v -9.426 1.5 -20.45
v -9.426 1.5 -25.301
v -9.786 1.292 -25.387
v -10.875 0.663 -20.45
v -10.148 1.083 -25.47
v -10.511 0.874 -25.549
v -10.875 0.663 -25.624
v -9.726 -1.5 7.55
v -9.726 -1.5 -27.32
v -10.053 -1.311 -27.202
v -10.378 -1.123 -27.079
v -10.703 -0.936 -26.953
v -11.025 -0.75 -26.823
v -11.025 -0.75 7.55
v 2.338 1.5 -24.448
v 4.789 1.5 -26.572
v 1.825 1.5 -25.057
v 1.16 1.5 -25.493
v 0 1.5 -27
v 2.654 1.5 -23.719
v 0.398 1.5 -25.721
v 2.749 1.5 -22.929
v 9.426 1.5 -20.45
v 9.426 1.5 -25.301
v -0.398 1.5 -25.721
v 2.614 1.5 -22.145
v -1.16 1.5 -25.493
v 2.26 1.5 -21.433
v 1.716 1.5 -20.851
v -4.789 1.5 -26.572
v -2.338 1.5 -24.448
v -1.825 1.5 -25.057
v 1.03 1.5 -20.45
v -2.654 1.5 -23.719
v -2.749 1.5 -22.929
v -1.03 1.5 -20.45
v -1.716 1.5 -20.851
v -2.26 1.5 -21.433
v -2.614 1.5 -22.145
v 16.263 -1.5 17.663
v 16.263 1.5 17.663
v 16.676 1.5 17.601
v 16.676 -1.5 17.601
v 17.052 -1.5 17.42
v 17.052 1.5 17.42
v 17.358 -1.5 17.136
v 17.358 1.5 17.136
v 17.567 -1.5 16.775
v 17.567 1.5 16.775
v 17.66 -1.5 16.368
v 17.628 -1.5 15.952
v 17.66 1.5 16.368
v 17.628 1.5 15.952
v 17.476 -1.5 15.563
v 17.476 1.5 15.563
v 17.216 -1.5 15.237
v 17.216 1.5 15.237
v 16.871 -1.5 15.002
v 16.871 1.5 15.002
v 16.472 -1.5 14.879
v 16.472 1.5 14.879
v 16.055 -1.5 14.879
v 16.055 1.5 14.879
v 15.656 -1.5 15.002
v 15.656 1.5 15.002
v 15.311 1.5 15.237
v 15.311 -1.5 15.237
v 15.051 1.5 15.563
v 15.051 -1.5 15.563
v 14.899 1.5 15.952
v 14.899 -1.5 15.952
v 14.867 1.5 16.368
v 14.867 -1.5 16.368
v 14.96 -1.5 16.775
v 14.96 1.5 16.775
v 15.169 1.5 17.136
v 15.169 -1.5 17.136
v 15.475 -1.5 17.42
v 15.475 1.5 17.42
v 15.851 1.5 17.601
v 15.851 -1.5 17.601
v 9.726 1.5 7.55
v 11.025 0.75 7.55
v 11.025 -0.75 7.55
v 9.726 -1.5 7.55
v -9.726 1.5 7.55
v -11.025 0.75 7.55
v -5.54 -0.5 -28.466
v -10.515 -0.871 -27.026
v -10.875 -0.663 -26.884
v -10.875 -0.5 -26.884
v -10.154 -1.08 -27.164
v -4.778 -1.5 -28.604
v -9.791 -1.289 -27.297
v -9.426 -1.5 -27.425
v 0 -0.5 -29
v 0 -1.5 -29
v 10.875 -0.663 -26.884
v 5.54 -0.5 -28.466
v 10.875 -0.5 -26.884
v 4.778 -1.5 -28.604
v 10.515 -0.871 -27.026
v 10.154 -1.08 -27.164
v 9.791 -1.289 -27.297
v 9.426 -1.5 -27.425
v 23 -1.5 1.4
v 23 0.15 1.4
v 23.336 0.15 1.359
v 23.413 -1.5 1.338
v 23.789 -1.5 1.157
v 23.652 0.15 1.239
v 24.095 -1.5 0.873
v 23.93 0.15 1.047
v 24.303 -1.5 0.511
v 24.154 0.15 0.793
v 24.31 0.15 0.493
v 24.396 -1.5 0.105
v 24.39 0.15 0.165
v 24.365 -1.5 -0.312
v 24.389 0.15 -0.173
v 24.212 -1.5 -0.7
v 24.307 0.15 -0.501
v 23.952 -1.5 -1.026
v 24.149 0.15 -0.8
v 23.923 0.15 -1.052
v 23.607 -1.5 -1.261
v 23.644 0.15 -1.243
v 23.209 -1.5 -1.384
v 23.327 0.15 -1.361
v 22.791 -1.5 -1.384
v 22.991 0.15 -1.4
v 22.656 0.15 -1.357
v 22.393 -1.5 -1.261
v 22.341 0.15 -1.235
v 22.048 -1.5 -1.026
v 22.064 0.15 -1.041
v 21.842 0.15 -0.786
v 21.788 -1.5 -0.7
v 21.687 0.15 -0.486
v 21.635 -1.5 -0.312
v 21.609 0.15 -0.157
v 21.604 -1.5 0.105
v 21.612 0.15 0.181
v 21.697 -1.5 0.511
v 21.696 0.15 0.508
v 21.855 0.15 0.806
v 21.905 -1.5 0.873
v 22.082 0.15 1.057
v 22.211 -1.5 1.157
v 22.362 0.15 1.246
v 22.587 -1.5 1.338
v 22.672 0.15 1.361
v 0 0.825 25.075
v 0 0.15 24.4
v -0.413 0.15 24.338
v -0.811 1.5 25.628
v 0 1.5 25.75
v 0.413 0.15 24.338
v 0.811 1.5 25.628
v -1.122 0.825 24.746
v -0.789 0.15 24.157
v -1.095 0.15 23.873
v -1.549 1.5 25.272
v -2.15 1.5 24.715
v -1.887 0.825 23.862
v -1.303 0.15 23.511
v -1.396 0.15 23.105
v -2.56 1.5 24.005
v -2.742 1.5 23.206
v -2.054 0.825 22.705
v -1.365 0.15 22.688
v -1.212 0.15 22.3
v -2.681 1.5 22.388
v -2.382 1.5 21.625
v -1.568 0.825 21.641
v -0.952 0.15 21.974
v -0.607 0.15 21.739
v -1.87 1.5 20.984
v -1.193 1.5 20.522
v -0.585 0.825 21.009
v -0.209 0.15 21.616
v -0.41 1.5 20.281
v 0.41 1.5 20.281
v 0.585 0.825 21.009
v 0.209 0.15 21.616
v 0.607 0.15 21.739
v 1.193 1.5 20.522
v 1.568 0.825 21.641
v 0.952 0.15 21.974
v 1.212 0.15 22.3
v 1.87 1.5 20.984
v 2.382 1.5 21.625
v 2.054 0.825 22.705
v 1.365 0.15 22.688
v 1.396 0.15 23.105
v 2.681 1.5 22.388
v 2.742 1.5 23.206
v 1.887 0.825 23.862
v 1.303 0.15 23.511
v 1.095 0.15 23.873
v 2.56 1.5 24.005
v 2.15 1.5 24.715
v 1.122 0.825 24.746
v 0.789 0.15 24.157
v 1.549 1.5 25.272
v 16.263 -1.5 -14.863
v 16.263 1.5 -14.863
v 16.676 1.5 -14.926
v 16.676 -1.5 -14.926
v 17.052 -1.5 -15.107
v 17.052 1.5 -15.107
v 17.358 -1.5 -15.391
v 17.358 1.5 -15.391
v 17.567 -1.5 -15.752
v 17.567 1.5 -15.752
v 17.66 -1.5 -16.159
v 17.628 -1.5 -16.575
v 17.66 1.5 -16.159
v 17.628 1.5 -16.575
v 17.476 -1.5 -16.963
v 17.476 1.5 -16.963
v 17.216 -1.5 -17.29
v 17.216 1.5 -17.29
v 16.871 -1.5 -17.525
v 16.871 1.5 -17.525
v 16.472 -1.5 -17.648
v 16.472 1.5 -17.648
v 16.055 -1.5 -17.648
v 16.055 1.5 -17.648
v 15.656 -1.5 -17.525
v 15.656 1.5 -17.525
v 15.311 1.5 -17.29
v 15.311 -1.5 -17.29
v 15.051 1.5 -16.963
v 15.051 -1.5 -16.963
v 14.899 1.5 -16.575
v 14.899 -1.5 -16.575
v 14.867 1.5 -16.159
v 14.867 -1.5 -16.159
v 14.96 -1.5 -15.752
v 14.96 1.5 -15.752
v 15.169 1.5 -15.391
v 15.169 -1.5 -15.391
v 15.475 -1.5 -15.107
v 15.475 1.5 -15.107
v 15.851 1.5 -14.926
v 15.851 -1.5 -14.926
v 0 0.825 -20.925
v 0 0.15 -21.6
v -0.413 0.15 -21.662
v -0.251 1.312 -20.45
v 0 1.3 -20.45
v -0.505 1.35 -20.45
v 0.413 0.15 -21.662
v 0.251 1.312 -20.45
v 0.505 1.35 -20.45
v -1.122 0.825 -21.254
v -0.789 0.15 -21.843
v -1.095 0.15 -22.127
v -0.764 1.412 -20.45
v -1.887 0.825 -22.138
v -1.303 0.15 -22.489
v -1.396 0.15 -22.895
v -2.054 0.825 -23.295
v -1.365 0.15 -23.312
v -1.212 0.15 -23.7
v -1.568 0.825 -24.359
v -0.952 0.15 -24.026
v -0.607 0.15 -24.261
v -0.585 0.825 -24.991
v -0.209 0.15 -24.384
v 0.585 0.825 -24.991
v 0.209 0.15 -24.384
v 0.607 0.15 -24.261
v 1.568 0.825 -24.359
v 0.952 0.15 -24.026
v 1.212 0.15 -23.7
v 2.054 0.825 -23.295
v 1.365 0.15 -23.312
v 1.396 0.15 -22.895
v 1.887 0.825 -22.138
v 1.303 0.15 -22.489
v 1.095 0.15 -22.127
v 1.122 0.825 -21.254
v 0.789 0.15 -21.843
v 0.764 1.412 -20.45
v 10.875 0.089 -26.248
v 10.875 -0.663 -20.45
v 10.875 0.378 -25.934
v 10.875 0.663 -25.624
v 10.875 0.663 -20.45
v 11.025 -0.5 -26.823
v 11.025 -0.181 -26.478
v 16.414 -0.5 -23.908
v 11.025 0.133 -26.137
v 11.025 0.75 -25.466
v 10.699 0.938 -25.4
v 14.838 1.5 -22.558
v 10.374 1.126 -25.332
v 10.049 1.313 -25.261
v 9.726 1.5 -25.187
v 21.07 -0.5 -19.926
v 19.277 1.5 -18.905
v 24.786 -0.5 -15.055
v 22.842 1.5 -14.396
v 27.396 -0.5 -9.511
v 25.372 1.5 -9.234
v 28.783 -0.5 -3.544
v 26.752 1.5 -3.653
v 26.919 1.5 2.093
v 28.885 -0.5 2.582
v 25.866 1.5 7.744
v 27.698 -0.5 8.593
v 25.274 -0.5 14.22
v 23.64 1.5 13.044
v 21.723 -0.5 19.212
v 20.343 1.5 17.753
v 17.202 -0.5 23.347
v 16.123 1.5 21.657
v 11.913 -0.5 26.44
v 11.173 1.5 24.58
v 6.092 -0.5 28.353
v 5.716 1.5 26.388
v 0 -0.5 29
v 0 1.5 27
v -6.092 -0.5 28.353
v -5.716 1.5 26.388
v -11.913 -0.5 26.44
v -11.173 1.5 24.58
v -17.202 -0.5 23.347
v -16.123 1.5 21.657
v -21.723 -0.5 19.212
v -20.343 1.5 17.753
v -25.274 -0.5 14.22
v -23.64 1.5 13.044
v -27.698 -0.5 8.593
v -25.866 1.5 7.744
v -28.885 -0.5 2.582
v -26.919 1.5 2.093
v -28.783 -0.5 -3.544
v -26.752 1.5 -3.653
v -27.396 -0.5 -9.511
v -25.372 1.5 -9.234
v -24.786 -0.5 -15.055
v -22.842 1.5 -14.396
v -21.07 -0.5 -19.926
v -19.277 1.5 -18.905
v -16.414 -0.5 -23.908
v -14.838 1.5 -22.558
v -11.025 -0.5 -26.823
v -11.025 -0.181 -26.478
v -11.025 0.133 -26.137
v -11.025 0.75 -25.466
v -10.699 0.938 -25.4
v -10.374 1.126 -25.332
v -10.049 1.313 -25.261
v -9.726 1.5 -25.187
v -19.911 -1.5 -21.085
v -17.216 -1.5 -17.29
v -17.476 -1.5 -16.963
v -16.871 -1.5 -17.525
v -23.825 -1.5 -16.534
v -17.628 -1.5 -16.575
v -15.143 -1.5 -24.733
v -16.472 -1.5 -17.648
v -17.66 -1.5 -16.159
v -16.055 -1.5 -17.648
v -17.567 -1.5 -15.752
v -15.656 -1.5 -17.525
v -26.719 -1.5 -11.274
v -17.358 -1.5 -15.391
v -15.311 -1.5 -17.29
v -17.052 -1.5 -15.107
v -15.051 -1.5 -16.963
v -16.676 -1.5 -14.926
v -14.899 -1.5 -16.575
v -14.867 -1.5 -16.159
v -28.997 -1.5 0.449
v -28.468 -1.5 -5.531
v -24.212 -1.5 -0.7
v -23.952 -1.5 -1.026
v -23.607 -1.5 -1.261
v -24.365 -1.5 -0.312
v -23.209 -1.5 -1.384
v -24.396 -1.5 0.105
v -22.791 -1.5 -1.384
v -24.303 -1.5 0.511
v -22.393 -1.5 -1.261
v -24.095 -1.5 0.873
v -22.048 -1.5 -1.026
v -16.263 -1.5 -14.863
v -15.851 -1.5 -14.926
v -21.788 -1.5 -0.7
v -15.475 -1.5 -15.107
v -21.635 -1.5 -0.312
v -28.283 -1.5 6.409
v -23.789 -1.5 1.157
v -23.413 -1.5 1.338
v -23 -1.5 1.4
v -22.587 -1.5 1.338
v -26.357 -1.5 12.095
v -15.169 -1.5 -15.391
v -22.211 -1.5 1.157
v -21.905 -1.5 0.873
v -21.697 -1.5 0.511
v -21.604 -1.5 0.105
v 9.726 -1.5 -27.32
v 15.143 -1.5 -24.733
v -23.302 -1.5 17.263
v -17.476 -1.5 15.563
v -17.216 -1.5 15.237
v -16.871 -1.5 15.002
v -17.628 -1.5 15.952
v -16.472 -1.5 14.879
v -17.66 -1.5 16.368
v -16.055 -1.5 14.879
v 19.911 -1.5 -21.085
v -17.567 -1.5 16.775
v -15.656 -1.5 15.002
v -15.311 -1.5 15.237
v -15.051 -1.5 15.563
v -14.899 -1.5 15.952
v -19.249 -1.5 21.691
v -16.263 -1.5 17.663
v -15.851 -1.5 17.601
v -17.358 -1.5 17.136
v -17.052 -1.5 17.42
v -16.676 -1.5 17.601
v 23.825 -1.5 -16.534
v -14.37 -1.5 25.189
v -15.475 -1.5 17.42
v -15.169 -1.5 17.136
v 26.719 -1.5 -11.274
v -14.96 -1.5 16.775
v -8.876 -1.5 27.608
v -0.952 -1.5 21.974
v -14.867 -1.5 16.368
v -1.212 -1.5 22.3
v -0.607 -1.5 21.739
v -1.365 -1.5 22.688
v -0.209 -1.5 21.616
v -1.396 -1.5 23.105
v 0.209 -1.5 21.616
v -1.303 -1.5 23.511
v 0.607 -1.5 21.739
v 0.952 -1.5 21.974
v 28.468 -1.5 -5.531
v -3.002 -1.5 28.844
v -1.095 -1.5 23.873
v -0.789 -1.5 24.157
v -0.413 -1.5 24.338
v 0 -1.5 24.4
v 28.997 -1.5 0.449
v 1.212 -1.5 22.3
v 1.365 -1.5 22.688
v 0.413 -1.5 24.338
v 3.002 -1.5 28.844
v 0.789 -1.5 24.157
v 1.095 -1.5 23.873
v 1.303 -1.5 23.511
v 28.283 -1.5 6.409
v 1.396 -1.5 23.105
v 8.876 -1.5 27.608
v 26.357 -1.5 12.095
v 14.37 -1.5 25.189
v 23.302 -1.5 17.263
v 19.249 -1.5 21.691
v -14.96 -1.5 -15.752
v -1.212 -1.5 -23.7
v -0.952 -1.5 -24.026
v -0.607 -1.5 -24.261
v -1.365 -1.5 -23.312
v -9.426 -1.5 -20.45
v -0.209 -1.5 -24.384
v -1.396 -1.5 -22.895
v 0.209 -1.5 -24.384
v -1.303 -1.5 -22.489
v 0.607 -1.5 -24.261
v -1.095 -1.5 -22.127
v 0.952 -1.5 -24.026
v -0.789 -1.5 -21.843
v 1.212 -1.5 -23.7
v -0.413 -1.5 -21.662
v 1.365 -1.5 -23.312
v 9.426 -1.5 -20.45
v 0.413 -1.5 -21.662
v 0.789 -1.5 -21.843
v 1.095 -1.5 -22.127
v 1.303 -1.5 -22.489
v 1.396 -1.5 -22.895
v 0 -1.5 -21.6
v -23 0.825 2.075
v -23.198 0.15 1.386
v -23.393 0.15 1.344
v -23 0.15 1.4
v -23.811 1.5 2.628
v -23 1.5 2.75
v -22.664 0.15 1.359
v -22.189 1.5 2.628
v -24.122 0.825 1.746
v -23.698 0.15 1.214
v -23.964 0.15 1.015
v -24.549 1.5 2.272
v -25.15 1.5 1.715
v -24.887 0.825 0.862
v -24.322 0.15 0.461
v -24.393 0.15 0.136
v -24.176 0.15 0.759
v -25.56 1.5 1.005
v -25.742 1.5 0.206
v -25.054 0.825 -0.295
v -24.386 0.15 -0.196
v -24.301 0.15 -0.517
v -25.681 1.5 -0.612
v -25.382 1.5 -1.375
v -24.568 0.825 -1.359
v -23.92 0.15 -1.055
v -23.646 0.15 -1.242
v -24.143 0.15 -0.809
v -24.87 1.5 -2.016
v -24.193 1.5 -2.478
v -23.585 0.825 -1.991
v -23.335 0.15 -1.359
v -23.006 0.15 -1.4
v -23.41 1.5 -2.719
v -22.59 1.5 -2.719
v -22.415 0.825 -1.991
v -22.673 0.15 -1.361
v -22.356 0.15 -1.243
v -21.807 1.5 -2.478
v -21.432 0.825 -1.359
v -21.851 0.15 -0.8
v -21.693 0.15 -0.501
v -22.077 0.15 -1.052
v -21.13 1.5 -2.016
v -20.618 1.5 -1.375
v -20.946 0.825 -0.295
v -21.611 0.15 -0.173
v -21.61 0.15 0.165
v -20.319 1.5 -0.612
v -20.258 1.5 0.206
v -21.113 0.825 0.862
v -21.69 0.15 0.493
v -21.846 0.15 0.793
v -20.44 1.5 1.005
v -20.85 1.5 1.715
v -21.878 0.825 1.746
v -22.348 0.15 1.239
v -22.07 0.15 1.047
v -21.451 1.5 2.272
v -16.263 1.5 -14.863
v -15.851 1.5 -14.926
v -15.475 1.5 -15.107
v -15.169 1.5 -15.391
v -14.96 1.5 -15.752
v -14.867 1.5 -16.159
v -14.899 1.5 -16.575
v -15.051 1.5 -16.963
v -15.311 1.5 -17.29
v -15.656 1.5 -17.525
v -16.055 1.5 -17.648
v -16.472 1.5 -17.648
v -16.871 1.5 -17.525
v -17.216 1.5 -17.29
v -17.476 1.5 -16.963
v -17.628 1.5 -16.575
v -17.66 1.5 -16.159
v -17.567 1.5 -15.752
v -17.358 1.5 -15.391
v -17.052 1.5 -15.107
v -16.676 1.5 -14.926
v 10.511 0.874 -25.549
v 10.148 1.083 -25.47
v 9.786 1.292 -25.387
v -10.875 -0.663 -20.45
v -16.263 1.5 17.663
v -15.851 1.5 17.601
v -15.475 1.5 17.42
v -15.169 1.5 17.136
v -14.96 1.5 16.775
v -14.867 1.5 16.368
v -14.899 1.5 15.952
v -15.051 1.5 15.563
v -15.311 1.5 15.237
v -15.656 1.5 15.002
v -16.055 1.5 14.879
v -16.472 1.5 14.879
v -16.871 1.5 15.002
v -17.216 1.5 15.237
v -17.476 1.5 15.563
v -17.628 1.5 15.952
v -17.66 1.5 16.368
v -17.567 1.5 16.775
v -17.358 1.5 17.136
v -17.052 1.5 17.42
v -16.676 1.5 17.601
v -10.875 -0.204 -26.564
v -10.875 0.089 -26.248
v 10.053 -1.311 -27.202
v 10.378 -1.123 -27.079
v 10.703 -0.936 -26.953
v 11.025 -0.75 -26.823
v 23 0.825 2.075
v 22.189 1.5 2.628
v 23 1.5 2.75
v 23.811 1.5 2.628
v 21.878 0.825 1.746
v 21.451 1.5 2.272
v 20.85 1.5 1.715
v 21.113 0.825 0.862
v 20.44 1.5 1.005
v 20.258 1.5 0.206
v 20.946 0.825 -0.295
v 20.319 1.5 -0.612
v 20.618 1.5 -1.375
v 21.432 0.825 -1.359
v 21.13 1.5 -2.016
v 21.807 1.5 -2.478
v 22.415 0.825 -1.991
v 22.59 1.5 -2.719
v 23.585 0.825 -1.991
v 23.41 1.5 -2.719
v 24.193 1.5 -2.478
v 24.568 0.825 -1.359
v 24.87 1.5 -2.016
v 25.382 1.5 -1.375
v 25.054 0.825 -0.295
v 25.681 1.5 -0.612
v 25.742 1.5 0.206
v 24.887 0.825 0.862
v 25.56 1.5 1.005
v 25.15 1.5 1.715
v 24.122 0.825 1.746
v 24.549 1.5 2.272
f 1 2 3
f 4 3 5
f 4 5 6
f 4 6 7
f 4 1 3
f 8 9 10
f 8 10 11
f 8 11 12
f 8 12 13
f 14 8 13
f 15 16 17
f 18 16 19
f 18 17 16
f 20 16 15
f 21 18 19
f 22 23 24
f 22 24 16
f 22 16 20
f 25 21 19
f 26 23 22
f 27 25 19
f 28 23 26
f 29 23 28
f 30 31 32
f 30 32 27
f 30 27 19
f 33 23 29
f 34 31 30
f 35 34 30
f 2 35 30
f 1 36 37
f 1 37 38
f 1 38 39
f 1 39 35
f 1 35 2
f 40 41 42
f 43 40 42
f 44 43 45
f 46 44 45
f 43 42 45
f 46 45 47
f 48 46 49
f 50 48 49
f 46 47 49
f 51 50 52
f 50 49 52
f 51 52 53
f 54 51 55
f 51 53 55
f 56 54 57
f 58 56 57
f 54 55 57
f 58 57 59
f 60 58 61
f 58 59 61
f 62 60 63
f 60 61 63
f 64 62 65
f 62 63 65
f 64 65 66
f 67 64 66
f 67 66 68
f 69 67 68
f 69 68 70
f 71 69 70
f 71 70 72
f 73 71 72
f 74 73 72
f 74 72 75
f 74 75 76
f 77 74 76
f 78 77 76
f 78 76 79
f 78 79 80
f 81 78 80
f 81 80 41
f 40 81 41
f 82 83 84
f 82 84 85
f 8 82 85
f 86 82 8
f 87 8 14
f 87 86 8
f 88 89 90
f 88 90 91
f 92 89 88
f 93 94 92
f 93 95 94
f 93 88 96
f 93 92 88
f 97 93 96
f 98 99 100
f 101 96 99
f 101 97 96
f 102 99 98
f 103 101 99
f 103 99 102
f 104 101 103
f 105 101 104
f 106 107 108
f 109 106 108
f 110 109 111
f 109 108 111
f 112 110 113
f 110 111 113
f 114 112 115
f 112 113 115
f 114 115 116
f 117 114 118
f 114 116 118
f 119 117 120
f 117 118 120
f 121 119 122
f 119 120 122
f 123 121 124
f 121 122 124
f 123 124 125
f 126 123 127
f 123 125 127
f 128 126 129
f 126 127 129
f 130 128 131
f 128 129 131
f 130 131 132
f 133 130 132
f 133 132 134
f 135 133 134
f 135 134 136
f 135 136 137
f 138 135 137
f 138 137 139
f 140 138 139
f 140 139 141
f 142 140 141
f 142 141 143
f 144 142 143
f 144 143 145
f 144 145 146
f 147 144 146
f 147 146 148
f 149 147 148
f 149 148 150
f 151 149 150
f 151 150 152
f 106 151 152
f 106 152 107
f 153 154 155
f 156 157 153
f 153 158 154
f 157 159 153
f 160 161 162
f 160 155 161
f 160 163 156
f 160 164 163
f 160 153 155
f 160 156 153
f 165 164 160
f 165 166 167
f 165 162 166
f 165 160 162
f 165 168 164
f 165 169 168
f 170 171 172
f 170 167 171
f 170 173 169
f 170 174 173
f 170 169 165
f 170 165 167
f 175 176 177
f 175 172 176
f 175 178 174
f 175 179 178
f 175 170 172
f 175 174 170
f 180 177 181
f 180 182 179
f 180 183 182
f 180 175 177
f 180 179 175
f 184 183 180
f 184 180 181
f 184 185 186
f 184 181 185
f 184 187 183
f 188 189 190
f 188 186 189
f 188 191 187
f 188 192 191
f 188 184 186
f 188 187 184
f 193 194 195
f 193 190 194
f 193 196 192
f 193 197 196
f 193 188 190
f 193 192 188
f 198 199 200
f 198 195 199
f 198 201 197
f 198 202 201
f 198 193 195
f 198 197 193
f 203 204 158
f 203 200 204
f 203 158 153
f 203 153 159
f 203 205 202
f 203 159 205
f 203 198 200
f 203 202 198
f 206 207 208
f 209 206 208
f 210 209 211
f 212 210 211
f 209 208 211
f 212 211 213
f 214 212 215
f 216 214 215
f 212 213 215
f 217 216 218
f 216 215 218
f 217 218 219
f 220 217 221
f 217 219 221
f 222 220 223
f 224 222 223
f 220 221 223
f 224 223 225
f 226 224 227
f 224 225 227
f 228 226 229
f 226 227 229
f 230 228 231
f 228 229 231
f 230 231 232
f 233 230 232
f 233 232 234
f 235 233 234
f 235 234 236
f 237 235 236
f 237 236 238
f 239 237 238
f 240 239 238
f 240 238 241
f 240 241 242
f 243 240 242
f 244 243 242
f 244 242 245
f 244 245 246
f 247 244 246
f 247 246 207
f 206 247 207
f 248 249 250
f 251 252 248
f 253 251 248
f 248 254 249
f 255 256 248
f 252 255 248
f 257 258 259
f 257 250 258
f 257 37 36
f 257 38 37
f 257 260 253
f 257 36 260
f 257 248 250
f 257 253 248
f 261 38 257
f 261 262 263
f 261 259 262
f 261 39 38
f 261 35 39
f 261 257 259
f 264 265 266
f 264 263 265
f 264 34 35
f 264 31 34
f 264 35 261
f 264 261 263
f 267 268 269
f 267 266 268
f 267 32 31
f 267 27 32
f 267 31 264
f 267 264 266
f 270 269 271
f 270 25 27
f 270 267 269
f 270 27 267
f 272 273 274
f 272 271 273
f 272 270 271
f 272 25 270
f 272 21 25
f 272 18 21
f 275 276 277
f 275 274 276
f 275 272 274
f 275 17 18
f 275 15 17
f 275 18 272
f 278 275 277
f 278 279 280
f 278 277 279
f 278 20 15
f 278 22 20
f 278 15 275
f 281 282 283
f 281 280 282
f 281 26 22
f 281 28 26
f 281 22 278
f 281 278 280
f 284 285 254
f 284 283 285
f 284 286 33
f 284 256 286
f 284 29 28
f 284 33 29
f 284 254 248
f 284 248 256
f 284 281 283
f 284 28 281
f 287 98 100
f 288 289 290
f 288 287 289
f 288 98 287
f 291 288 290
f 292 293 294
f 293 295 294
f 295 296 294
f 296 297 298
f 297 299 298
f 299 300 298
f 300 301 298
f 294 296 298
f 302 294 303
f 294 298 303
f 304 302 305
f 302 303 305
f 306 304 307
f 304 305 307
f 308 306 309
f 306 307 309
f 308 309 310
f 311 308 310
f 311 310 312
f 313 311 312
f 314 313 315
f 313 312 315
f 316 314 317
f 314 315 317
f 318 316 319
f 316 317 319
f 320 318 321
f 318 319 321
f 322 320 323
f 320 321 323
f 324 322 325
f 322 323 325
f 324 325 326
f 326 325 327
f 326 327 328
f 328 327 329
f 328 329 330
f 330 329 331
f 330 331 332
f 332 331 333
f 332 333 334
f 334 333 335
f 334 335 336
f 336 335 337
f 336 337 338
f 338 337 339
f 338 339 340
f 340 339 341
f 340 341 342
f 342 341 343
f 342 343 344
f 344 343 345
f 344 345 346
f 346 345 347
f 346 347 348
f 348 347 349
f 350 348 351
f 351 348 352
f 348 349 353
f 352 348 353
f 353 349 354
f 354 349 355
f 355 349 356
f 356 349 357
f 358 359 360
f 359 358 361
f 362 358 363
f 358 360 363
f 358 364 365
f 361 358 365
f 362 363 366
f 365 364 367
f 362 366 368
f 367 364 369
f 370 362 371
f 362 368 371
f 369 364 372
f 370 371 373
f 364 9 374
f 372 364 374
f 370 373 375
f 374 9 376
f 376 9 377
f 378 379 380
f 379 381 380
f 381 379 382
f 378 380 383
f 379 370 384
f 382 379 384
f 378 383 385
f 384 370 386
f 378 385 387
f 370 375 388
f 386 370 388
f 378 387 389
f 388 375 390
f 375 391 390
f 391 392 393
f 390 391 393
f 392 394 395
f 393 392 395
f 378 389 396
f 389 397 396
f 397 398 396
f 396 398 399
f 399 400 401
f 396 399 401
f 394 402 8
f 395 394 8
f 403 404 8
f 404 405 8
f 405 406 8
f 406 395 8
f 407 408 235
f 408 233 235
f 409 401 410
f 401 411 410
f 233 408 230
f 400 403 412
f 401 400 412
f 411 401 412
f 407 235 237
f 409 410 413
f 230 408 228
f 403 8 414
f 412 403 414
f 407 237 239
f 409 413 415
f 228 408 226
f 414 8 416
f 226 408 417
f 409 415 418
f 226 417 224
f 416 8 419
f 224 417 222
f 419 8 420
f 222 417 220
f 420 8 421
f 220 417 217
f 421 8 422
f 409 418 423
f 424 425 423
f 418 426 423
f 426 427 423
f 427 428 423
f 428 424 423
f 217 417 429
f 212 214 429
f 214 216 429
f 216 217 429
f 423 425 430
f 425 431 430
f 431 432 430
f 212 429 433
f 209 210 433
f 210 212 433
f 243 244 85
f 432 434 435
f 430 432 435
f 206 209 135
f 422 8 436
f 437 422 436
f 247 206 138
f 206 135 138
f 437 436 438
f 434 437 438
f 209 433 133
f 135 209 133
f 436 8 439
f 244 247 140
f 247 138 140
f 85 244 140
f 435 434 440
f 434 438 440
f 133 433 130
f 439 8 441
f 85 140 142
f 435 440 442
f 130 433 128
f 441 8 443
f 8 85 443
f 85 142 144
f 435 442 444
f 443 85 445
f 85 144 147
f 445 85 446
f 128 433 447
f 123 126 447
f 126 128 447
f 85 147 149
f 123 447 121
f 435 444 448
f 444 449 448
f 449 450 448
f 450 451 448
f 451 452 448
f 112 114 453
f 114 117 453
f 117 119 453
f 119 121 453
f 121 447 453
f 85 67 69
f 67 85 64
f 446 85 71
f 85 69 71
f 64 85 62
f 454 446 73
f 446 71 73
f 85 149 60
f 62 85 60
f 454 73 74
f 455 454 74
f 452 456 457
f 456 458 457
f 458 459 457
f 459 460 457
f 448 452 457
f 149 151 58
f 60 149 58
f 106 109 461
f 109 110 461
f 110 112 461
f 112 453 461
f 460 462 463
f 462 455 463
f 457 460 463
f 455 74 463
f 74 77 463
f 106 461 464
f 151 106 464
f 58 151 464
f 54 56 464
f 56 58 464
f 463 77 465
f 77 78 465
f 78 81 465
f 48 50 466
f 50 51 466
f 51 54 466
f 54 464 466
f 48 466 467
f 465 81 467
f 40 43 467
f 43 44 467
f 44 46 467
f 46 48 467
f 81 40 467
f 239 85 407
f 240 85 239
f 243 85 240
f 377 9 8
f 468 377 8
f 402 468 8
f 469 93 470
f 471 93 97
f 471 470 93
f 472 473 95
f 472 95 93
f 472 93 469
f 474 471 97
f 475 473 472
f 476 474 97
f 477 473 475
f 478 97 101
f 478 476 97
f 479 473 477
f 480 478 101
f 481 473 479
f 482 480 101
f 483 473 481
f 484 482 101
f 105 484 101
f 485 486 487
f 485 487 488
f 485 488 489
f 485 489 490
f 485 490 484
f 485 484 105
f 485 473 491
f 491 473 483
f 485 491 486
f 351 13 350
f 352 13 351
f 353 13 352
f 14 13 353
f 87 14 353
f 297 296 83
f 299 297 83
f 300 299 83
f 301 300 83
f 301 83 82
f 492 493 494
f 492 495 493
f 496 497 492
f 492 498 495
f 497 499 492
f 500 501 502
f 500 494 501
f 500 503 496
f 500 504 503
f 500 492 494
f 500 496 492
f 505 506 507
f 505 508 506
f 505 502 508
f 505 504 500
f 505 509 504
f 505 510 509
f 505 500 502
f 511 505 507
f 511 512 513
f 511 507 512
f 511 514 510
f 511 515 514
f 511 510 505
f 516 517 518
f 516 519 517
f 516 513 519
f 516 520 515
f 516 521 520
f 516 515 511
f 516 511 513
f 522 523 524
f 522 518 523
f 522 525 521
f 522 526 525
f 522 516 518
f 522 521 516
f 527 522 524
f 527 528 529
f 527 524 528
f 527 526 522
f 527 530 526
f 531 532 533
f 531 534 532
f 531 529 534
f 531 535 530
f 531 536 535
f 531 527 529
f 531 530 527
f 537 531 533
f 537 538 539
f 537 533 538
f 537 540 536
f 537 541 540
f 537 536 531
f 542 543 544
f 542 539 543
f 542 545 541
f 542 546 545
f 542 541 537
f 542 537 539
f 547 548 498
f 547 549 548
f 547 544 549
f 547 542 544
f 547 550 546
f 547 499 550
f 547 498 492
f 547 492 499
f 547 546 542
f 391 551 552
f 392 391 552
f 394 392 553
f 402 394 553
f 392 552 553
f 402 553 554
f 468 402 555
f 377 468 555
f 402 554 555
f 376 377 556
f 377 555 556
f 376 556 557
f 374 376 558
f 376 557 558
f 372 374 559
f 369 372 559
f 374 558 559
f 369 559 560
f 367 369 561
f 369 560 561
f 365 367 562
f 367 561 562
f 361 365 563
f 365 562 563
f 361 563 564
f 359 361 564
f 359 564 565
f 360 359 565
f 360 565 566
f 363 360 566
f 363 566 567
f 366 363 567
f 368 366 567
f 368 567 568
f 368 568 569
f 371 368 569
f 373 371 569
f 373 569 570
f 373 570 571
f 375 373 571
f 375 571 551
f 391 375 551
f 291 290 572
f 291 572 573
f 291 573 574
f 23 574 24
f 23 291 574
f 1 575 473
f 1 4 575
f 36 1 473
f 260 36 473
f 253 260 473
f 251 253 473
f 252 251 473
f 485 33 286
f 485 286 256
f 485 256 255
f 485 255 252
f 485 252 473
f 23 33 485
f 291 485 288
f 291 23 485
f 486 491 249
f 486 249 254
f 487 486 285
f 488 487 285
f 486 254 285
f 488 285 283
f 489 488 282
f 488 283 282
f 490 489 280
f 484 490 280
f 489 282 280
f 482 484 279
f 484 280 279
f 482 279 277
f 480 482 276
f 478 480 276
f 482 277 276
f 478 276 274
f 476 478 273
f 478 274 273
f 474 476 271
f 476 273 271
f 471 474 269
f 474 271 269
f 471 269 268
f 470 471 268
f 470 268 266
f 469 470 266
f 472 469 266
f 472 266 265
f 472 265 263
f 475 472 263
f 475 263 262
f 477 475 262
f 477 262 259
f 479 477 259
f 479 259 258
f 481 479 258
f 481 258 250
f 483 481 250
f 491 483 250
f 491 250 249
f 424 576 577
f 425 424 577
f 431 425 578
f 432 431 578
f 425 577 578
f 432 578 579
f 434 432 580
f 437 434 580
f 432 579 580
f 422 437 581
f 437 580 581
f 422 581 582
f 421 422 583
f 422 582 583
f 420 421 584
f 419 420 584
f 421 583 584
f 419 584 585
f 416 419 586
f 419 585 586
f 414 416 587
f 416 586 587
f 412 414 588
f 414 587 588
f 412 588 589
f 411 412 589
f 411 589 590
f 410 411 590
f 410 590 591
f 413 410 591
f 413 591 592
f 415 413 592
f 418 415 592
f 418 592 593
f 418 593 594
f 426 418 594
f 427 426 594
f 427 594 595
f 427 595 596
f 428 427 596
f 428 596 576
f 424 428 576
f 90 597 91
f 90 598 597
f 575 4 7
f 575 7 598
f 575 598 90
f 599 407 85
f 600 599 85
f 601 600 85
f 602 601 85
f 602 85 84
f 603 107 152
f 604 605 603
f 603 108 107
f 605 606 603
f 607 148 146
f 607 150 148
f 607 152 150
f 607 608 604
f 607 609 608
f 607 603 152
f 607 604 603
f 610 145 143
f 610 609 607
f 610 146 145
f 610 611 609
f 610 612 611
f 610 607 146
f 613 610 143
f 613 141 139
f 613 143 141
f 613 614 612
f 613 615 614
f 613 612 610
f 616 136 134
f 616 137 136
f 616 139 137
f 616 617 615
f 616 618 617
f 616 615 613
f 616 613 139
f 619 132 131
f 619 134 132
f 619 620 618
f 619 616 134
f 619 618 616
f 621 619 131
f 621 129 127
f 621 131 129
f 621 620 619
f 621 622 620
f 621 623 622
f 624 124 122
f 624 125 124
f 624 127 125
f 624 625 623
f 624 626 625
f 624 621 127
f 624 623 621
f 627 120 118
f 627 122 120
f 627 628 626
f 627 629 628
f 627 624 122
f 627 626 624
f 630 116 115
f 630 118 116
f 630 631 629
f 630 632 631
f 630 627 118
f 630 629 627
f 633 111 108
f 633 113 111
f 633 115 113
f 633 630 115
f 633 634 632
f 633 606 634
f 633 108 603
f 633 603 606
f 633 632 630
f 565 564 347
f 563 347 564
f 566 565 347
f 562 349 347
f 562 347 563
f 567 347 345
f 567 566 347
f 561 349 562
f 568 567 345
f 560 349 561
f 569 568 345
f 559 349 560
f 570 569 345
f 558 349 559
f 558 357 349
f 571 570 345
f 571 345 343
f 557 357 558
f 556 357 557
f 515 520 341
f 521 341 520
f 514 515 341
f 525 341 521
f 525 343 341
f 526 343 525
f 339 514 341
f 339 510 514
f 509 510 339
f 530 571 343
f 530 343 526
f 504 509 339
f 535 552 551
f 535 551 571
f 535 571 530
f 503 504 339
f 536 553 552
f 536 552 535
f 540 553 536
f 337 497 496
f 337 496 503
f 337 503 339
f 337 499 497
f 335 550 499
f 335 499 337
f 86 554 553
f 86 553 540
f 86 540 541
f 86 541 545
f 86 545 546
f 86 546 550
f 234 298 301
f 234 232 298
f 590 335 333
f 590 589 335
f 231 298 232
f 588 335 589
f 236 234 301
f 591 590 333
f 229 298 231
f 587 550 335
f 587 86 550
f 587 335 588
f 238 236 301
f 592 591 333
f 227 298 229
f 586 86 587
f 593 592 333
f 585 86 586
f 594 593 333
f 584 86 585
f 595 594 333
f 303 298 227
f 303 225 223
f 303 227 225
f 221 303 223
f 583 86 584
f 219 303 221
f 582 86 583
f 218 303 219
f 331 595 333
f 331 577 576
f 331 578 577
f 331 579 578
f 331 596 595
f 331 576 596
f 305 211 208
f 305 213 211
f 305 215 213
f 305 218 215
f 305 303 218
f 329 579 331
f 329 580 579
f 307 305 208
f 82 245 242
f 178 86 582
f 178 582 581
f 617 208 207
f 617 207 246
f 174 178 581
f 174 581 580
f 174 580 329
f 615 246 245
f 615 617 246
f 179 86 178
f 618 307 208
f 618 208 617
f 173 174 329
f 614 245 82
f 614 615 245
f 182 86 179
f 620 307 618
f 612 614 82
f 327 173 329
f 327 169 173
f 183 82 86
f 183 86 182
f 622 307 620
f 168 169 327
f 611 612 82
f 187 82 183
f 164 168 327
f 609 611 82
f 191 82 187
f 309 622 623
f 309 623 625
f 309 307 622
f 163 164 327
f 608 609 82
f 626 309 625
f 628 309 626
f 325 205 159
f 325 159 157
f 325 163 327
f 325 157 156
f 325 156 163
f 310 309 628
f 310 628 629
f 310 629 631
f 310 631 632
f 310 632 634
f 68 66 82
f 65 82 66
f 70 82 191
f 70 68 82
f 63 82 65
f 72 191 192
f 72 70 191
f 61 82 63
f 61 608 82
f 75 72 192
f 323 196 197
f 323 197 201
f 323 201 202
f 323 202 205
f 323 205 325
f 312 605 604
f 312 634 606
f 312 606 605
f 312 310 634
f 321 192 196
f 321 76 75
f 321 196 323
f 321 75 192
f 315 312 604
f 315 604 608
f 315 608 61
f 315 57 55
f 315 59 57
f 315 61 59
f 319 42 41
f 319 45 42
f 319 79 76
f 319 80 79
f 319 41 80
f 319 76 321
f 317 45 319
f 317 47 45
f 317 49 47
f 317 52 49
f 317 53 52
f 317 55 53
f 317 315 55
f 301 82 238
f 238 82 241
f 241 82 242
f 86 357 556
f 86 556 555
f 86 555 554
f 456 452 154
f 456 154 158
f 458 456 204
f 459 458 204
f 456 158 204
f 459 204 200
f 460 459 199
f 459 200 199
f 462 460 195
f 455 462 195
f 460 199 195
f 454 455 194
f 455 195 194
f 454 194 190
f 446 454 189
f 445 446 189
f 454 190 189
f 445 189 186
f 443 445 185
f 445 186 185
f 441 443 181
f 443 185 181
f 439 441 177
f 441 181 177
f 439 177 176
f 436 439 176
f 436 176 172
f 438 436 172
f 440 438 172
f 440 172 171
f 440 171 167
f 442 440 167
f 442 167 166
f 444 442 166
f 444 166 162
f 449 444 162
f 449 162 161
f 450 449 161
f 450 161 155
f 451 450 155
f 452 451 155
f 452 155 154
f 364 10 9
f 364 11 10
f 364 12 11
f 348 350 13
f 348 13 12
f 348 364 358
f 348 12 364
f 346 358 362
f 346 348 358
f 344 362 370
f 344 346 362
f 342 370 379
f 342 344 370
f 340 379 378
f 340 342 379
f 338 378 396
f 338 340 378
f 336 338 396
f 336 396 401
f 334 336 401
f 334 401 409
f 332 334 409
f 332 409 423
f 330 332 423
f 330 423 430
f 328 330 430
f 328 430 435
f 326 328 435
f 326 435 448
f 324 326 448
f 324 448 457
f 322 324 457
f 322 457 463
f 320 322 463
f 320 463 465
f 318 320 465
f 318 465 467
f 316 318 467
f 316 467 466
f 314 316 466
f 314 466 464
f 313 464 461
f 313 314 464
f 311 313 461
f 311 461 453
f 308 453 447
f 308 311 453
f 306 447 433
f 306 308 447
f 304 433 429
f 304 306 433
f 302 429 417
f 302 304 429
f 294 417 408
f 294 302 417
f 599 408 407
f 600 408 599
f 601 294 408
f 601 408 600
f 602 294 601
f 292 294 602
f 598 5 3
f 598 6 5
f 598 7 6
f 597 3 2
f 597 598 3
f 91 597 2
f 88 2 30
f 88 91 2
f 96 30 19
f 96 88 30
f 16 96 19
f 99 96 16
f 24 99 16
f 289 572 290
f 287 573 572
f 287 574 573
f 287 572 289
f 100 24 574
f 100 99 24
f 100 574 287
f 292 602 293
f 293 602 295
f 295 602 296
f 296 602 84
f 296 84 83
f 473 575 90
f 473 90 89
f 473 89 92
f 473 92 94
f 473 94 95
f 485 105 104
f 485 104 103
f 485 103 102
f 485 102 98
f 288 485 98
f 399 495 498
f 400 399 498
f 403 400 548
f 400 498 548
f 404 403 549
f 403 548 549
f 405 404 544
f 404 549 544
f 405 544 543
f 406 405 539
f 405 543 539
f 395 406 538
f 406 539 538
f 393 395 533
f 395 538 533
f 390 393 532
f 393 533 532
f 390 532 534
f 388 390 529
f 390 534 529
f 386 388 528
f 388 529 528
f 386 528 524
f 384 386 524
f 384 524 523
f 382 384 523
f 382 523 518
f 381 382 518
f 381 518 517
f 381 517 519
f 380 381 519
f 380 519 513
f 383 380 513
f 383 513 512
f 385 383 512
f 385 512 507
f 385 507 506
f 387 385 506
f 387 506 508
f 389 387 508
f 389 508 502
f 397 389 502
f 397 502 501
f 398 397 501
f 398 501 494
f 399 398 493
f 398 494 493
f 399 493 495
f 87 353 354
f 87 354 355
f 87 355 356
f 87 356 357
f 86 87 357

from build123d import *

# Parameters (mm, degrees)
SKETCH1_R                                      = 29
BOSS_EXTRUDE1_DEPTH                            = 1.5
CUT_EXTRUDE1_DEPTH                             = 42.12177039
BOSS_EXTRUDE2_REACH                            = 46.997
BOSS_EXTRUDE2_END_RADIUS                       = 29
BOSS_EXTRUDE3_REACH                            = 59.346
BOSS_EXTRUDE3_END_RADIUS                       = 29
CHAMFER1_SIZE                                  = 2
CHAMFER2_SIZE                                  = 2
SKETCH5_R                                      = 1.4
CUT_EXTRUDE2_DEPTH                             = 42.12177039
CSK_FOR_M2_5_FLAT_HEAD_MACHINE_SCREW1_AT_COUNT = 2
CSK_FOR_M2_5_FLAT_HEAD_MACHINE_SCREW1_AT_PITCH = 32.526911935
CSK_FOR_M2_5_FLAT_HEAD_MACHINE_SCREW_2_COUNT   = 2
CSK_FOR_M2_5_FLAT_HEAD_MACHINE_SCREW_2_PITCH   = 46
CSK_FOR_M2_5_FLAT_HEAD_MACHINE_SCREW_3_COUNT   = 2
CSK_FOR_M2_5_FLAT_HEAD_MACHINE_SCREW_3_PITCH   = 32.526911935


with BuildPart() as part:
    # Sketch1 → Boss-Extrude1 (new, symmetric)
    with BuildSketch(Plane(origin=(0, 0, 0), x_dir=(1, 0, 0), z_dir=(0, 1, 0))):
        with Locations(Location((0, 0, 0), (0, 0, 270))):
            Circle(SKETCH1_R)
    extrude(amount=BOSS_EXTRUDE1_DEPTH, both=True)

    # Sketch2 → Cut-Extrude1 (cut, through all)
    with BuildSketch(Plane(origin=(0, 1.5, 0), x_dir=(1, 0, 0), z_dir=(0, 1, 0))):
        Polygon((-11.025, 7.55), (-11.025, 29), (11.025, 29), (11.025, 7.55), (11.025, -7.55), (-11.025, -7.55), align=None)
    extrude(amount=-CUT_EXTRUDE1_DEPTH, mode=Mode.SUBTRACT)

    # Boss-Extrude2: up to this cylinder (the profile starts inside it)
    boss_extrude2_end = Plane(origin=(0, -0.7325095, 0), z_dir=(0, -1, 0)) * Cylinder(BOSS_EXTRUDE2_END_RADIUS, 154.459019, mode=Mode.PRIVATE)
    # Sketch3 → Boss-Extrude2 (add, up to the surface)
    with BuildSketch(Plane(origin=(0, 0, 7.55), x_dir=(-1, 0, 0), z_dir=(0, 0, -1)), mode=Mode.PRIVATE) as boss_extrude2_sk1:
        Polygon((-11.525, -1.5), (-9.725961894, -1.5), (-11.025, -0.75), (-11.025, 0.75), (-9.725961894, 1.5), (-11.525, 1.5), align=None)
    boss_extrude2_tool1 = extrude(boss_extrude2_sk1.sketch, amount=BOSS_EXTRUDE2_REACH, mode=Mode.PRIVATE) & boss_extrude2_end
    add(boss_extrude2_tool1.solids().sort_by_distance((10.625481, -1.465019, 7.55))[0])
    # Sketch3 → Boss-Extrude2 (add, up to the surface)
    with BuildSketch(Plane(origin=(0, 0, 7.55), x_dir=(-1, 0, 0), z_dir=(0, 0, -1)), mode=Mode.PRIVATE) as boss_extrude2_sk2:
        Polygon((11.525, 1.5), (11.525, -1.5), (9.725961894, -1.5), (11.025, -0.75), (11.025, 0.75), (9.725961894, 1.5), align=None)
    boss_extrude2_tool2 = extrude(boss_extrude2_sk2.sketch, amount=BOSS_EXTRUDE2_REACH, mode=Mode.PRIVATE) & boss_extrude2_end
    add(boss_extrude2_tool2.solids().sort_by_distance((-11.490019, 0, 7.55))[0])

    # Chamfer1
    chamfer1_edges = [part.edges().sort_by_distance(p)[0] for p in [
        (0, 1.5, 29),
    ]]
    chamfer(chamfer1_edges, length=CHAMFER1_SIZE)


with BuildPart() as body_2:
    # Boss-Extrude3: up to this cylinder (the profile starts inside it)
    boss_extrude3_end = Plane(origin=(0, 0, 0), z_dir=(0, -1, 0)) * Cylinder(BOSS_EXTRUDE3_END_RADIUS, 177.692, mode=Mode.PRIVATE)
    # Sketch6 → Boss-Extrude3 (new, up to the surface)
    with BuildSketch(Plane(origin=(0, 0, -20.45), x_dir=(-1, 0, 0), z_dir=(0, 0, -1)), mode=Mode.PRIVATE) as boss_extrude3_sk1:
        Polygon((9.425961894, -1.5), (-9.425961894, -1.5), (-10.875, -0.66339746), (-10.875, 0.66339746), (-9.425961894, 1.5), (9.425961894, 1.5), (10.875, 0.66339746), (10.875, -0.66339746), align=None)
    boss_extrude3_tool1 = extrude(boss_extrude3_sk1.sketch, amount=BOSS_EXTRUDE3_REACH, mode=Mode.PRIVATE) & boss_extrude3_end
    add(boss_extrude3_tool1.solids().sort_by_distance((0, 0, -20.45))[0])

    # Chamfer2
    # the kernel refuses this chamfer: 2 mm, written as the material it takes off along each edge
    with BuildSketch(Plane(origin=(0, 1.5, 0), x_dir=(-0.48679499684040417, 0, -0.8735162454420358), z_dir=(-0.8735162454420358, 0, 0.48679499684040417))) as chamfer2_piece_1:
        Polygon((29 - CHAMFER2_SIZE, 0), (29, CHAMFER2_SIZE), (29, 0), align=None)
    revolve(axis=Axis((0, 1.5, 0), (0, -1, 0)), revolution_arc=58.260285593, mode=Mode.SUBTRACT)


with BuildPart() as cut_extrude2_tool:
    # Sketch5 → Cut-Extrude2 (new, through all)
    with BuildSketch(Plane(origin=(0, 1.5, 0), x_dir=(1, 0, 0), z_dir=(0, 1, 0))):
        with Locations(Location((0, 23, 0), (0, 0, 270))):
            Circle(SKETCH5_R)
        with Locations(Location((16.263455967, 16.263455967, 0), (0, 0, 270))):
            Circle(SKETCH5_R)
        with Locations(Location((23, 0, 0), (0, 0, 270))):
            Circle(SKETCH5_R)
        with Locations(Location((16.263455967, -16.263455967, 0), (0, 0, 270))):
            Circle(SKETCH5_R)
        with Locations(Location((0, -23, 0), (0, 0, 270))):
            Circle(SKETCH5_R)
        with Locations(Location((-16.263455967, -16.263455967, 0), (0, 0, 270))):
            Circle(SKETCH5_R)
        with Locations(Location((-23, 0, 0), (0, 0, 270))):
            Circle(SKETCH5_R)
        with Locations(Location((-16.263455967, 16.263455967, 0), (0, 0, 270))):
            Circle(SKETCH5_R)
    extrude(amount=-CUT_EXTRUDE2_DEPTH)


with BuildPart() as part_1:
    add(part.part)

    # Cut-Extrude2: cut by cut_extrude2_tool
    add(cut_extrude2_tool.part, mode=Mode.SUBTRACT)


with BuildPart() as body_2_1:
    add(body_2.part)

    # Cut-Extrude2: cut by cut_extrude2_tool
    add(cut_extrude2_tool.part, mode=Mode.SUBTRACT)

    # Sketch8 → CSK for M2.5 Flat Head Machine Screw1 (revolve, cut)
    with BuildSketch(Plane(origin=(0, 1.5, -23), x_dir=(0, 0, 1), z_dir=(1, 0, 0))):
        Polygon((0, 0), (0, 3), (1.35, 3), (1.35, 1.4), (2.75, 0), align=None)
    csk_for_m2_5_flat_head_machine_screw1 = revolve(axis=Axis((0, 7.85, -23), (0, -1, 0)), mode=Mode.SUBTRACT)


with BuildPart() as part_2:
    add(part_1.part)

    # CSK for M2.5 Flat Head Machine Screw1 at: CSK for M2.5 Flat Head Machine Screw1 ×2
    with Locations(*[Vector(0.707106781186556, 0, 0.7071067811865391) * (i * CSK_FOR_M2_5_FLAT_HEAD_MACHINE_SCREW1_AT_PITCH) for i in range(1, CSK_FOR_M2_5_FLAT_HEAD_MACHINE_SCREW1_AT_COUNT)]):
        add(csk_for_m2_5_flat_head_machine_screw1, mode=Mode.SUBTRACT)

    # CSK for M2.5 Flat Head Machine Screw 2: CSK for M2.5 Flat Head Machine Screw1 ×2
    with Locations(*[(0, 0, i * CSK_FOR_M2_5_FLAT_HEAD_MACHINE_SCREW_2_PITCH) for i in range(1, CSK_FOR_M2_5_FLAT_HEAD_MACHINE_SCREW_2_COUNT)]):
        add(csk_for_m2_5_flat_head_machine_screw1, mode=Mode.SUBTRACT)

    # CSK for M2.5 Flat Head Machine Screw 3: CSK for M2.5 Flat Head Machine Screw1 ×2
    with Locations(*[Vector(-0.7071067811865475, 0, 0.7071067811865476) * (i * CSK_FOR_M2_5_FLAT_HEAD_MACHINE_SCREW_3_PITCH) for i in range(1, CSK_FOR_M2_5_FLAT_HEAD_MACHINE_SCREW_3_COUNT)]):
        add(csk_for_m2_5_flat_head_machine_screw1, mode=Mode.SUBTRACT)


solid = Compound([body_2_1.part, part_2.part])
